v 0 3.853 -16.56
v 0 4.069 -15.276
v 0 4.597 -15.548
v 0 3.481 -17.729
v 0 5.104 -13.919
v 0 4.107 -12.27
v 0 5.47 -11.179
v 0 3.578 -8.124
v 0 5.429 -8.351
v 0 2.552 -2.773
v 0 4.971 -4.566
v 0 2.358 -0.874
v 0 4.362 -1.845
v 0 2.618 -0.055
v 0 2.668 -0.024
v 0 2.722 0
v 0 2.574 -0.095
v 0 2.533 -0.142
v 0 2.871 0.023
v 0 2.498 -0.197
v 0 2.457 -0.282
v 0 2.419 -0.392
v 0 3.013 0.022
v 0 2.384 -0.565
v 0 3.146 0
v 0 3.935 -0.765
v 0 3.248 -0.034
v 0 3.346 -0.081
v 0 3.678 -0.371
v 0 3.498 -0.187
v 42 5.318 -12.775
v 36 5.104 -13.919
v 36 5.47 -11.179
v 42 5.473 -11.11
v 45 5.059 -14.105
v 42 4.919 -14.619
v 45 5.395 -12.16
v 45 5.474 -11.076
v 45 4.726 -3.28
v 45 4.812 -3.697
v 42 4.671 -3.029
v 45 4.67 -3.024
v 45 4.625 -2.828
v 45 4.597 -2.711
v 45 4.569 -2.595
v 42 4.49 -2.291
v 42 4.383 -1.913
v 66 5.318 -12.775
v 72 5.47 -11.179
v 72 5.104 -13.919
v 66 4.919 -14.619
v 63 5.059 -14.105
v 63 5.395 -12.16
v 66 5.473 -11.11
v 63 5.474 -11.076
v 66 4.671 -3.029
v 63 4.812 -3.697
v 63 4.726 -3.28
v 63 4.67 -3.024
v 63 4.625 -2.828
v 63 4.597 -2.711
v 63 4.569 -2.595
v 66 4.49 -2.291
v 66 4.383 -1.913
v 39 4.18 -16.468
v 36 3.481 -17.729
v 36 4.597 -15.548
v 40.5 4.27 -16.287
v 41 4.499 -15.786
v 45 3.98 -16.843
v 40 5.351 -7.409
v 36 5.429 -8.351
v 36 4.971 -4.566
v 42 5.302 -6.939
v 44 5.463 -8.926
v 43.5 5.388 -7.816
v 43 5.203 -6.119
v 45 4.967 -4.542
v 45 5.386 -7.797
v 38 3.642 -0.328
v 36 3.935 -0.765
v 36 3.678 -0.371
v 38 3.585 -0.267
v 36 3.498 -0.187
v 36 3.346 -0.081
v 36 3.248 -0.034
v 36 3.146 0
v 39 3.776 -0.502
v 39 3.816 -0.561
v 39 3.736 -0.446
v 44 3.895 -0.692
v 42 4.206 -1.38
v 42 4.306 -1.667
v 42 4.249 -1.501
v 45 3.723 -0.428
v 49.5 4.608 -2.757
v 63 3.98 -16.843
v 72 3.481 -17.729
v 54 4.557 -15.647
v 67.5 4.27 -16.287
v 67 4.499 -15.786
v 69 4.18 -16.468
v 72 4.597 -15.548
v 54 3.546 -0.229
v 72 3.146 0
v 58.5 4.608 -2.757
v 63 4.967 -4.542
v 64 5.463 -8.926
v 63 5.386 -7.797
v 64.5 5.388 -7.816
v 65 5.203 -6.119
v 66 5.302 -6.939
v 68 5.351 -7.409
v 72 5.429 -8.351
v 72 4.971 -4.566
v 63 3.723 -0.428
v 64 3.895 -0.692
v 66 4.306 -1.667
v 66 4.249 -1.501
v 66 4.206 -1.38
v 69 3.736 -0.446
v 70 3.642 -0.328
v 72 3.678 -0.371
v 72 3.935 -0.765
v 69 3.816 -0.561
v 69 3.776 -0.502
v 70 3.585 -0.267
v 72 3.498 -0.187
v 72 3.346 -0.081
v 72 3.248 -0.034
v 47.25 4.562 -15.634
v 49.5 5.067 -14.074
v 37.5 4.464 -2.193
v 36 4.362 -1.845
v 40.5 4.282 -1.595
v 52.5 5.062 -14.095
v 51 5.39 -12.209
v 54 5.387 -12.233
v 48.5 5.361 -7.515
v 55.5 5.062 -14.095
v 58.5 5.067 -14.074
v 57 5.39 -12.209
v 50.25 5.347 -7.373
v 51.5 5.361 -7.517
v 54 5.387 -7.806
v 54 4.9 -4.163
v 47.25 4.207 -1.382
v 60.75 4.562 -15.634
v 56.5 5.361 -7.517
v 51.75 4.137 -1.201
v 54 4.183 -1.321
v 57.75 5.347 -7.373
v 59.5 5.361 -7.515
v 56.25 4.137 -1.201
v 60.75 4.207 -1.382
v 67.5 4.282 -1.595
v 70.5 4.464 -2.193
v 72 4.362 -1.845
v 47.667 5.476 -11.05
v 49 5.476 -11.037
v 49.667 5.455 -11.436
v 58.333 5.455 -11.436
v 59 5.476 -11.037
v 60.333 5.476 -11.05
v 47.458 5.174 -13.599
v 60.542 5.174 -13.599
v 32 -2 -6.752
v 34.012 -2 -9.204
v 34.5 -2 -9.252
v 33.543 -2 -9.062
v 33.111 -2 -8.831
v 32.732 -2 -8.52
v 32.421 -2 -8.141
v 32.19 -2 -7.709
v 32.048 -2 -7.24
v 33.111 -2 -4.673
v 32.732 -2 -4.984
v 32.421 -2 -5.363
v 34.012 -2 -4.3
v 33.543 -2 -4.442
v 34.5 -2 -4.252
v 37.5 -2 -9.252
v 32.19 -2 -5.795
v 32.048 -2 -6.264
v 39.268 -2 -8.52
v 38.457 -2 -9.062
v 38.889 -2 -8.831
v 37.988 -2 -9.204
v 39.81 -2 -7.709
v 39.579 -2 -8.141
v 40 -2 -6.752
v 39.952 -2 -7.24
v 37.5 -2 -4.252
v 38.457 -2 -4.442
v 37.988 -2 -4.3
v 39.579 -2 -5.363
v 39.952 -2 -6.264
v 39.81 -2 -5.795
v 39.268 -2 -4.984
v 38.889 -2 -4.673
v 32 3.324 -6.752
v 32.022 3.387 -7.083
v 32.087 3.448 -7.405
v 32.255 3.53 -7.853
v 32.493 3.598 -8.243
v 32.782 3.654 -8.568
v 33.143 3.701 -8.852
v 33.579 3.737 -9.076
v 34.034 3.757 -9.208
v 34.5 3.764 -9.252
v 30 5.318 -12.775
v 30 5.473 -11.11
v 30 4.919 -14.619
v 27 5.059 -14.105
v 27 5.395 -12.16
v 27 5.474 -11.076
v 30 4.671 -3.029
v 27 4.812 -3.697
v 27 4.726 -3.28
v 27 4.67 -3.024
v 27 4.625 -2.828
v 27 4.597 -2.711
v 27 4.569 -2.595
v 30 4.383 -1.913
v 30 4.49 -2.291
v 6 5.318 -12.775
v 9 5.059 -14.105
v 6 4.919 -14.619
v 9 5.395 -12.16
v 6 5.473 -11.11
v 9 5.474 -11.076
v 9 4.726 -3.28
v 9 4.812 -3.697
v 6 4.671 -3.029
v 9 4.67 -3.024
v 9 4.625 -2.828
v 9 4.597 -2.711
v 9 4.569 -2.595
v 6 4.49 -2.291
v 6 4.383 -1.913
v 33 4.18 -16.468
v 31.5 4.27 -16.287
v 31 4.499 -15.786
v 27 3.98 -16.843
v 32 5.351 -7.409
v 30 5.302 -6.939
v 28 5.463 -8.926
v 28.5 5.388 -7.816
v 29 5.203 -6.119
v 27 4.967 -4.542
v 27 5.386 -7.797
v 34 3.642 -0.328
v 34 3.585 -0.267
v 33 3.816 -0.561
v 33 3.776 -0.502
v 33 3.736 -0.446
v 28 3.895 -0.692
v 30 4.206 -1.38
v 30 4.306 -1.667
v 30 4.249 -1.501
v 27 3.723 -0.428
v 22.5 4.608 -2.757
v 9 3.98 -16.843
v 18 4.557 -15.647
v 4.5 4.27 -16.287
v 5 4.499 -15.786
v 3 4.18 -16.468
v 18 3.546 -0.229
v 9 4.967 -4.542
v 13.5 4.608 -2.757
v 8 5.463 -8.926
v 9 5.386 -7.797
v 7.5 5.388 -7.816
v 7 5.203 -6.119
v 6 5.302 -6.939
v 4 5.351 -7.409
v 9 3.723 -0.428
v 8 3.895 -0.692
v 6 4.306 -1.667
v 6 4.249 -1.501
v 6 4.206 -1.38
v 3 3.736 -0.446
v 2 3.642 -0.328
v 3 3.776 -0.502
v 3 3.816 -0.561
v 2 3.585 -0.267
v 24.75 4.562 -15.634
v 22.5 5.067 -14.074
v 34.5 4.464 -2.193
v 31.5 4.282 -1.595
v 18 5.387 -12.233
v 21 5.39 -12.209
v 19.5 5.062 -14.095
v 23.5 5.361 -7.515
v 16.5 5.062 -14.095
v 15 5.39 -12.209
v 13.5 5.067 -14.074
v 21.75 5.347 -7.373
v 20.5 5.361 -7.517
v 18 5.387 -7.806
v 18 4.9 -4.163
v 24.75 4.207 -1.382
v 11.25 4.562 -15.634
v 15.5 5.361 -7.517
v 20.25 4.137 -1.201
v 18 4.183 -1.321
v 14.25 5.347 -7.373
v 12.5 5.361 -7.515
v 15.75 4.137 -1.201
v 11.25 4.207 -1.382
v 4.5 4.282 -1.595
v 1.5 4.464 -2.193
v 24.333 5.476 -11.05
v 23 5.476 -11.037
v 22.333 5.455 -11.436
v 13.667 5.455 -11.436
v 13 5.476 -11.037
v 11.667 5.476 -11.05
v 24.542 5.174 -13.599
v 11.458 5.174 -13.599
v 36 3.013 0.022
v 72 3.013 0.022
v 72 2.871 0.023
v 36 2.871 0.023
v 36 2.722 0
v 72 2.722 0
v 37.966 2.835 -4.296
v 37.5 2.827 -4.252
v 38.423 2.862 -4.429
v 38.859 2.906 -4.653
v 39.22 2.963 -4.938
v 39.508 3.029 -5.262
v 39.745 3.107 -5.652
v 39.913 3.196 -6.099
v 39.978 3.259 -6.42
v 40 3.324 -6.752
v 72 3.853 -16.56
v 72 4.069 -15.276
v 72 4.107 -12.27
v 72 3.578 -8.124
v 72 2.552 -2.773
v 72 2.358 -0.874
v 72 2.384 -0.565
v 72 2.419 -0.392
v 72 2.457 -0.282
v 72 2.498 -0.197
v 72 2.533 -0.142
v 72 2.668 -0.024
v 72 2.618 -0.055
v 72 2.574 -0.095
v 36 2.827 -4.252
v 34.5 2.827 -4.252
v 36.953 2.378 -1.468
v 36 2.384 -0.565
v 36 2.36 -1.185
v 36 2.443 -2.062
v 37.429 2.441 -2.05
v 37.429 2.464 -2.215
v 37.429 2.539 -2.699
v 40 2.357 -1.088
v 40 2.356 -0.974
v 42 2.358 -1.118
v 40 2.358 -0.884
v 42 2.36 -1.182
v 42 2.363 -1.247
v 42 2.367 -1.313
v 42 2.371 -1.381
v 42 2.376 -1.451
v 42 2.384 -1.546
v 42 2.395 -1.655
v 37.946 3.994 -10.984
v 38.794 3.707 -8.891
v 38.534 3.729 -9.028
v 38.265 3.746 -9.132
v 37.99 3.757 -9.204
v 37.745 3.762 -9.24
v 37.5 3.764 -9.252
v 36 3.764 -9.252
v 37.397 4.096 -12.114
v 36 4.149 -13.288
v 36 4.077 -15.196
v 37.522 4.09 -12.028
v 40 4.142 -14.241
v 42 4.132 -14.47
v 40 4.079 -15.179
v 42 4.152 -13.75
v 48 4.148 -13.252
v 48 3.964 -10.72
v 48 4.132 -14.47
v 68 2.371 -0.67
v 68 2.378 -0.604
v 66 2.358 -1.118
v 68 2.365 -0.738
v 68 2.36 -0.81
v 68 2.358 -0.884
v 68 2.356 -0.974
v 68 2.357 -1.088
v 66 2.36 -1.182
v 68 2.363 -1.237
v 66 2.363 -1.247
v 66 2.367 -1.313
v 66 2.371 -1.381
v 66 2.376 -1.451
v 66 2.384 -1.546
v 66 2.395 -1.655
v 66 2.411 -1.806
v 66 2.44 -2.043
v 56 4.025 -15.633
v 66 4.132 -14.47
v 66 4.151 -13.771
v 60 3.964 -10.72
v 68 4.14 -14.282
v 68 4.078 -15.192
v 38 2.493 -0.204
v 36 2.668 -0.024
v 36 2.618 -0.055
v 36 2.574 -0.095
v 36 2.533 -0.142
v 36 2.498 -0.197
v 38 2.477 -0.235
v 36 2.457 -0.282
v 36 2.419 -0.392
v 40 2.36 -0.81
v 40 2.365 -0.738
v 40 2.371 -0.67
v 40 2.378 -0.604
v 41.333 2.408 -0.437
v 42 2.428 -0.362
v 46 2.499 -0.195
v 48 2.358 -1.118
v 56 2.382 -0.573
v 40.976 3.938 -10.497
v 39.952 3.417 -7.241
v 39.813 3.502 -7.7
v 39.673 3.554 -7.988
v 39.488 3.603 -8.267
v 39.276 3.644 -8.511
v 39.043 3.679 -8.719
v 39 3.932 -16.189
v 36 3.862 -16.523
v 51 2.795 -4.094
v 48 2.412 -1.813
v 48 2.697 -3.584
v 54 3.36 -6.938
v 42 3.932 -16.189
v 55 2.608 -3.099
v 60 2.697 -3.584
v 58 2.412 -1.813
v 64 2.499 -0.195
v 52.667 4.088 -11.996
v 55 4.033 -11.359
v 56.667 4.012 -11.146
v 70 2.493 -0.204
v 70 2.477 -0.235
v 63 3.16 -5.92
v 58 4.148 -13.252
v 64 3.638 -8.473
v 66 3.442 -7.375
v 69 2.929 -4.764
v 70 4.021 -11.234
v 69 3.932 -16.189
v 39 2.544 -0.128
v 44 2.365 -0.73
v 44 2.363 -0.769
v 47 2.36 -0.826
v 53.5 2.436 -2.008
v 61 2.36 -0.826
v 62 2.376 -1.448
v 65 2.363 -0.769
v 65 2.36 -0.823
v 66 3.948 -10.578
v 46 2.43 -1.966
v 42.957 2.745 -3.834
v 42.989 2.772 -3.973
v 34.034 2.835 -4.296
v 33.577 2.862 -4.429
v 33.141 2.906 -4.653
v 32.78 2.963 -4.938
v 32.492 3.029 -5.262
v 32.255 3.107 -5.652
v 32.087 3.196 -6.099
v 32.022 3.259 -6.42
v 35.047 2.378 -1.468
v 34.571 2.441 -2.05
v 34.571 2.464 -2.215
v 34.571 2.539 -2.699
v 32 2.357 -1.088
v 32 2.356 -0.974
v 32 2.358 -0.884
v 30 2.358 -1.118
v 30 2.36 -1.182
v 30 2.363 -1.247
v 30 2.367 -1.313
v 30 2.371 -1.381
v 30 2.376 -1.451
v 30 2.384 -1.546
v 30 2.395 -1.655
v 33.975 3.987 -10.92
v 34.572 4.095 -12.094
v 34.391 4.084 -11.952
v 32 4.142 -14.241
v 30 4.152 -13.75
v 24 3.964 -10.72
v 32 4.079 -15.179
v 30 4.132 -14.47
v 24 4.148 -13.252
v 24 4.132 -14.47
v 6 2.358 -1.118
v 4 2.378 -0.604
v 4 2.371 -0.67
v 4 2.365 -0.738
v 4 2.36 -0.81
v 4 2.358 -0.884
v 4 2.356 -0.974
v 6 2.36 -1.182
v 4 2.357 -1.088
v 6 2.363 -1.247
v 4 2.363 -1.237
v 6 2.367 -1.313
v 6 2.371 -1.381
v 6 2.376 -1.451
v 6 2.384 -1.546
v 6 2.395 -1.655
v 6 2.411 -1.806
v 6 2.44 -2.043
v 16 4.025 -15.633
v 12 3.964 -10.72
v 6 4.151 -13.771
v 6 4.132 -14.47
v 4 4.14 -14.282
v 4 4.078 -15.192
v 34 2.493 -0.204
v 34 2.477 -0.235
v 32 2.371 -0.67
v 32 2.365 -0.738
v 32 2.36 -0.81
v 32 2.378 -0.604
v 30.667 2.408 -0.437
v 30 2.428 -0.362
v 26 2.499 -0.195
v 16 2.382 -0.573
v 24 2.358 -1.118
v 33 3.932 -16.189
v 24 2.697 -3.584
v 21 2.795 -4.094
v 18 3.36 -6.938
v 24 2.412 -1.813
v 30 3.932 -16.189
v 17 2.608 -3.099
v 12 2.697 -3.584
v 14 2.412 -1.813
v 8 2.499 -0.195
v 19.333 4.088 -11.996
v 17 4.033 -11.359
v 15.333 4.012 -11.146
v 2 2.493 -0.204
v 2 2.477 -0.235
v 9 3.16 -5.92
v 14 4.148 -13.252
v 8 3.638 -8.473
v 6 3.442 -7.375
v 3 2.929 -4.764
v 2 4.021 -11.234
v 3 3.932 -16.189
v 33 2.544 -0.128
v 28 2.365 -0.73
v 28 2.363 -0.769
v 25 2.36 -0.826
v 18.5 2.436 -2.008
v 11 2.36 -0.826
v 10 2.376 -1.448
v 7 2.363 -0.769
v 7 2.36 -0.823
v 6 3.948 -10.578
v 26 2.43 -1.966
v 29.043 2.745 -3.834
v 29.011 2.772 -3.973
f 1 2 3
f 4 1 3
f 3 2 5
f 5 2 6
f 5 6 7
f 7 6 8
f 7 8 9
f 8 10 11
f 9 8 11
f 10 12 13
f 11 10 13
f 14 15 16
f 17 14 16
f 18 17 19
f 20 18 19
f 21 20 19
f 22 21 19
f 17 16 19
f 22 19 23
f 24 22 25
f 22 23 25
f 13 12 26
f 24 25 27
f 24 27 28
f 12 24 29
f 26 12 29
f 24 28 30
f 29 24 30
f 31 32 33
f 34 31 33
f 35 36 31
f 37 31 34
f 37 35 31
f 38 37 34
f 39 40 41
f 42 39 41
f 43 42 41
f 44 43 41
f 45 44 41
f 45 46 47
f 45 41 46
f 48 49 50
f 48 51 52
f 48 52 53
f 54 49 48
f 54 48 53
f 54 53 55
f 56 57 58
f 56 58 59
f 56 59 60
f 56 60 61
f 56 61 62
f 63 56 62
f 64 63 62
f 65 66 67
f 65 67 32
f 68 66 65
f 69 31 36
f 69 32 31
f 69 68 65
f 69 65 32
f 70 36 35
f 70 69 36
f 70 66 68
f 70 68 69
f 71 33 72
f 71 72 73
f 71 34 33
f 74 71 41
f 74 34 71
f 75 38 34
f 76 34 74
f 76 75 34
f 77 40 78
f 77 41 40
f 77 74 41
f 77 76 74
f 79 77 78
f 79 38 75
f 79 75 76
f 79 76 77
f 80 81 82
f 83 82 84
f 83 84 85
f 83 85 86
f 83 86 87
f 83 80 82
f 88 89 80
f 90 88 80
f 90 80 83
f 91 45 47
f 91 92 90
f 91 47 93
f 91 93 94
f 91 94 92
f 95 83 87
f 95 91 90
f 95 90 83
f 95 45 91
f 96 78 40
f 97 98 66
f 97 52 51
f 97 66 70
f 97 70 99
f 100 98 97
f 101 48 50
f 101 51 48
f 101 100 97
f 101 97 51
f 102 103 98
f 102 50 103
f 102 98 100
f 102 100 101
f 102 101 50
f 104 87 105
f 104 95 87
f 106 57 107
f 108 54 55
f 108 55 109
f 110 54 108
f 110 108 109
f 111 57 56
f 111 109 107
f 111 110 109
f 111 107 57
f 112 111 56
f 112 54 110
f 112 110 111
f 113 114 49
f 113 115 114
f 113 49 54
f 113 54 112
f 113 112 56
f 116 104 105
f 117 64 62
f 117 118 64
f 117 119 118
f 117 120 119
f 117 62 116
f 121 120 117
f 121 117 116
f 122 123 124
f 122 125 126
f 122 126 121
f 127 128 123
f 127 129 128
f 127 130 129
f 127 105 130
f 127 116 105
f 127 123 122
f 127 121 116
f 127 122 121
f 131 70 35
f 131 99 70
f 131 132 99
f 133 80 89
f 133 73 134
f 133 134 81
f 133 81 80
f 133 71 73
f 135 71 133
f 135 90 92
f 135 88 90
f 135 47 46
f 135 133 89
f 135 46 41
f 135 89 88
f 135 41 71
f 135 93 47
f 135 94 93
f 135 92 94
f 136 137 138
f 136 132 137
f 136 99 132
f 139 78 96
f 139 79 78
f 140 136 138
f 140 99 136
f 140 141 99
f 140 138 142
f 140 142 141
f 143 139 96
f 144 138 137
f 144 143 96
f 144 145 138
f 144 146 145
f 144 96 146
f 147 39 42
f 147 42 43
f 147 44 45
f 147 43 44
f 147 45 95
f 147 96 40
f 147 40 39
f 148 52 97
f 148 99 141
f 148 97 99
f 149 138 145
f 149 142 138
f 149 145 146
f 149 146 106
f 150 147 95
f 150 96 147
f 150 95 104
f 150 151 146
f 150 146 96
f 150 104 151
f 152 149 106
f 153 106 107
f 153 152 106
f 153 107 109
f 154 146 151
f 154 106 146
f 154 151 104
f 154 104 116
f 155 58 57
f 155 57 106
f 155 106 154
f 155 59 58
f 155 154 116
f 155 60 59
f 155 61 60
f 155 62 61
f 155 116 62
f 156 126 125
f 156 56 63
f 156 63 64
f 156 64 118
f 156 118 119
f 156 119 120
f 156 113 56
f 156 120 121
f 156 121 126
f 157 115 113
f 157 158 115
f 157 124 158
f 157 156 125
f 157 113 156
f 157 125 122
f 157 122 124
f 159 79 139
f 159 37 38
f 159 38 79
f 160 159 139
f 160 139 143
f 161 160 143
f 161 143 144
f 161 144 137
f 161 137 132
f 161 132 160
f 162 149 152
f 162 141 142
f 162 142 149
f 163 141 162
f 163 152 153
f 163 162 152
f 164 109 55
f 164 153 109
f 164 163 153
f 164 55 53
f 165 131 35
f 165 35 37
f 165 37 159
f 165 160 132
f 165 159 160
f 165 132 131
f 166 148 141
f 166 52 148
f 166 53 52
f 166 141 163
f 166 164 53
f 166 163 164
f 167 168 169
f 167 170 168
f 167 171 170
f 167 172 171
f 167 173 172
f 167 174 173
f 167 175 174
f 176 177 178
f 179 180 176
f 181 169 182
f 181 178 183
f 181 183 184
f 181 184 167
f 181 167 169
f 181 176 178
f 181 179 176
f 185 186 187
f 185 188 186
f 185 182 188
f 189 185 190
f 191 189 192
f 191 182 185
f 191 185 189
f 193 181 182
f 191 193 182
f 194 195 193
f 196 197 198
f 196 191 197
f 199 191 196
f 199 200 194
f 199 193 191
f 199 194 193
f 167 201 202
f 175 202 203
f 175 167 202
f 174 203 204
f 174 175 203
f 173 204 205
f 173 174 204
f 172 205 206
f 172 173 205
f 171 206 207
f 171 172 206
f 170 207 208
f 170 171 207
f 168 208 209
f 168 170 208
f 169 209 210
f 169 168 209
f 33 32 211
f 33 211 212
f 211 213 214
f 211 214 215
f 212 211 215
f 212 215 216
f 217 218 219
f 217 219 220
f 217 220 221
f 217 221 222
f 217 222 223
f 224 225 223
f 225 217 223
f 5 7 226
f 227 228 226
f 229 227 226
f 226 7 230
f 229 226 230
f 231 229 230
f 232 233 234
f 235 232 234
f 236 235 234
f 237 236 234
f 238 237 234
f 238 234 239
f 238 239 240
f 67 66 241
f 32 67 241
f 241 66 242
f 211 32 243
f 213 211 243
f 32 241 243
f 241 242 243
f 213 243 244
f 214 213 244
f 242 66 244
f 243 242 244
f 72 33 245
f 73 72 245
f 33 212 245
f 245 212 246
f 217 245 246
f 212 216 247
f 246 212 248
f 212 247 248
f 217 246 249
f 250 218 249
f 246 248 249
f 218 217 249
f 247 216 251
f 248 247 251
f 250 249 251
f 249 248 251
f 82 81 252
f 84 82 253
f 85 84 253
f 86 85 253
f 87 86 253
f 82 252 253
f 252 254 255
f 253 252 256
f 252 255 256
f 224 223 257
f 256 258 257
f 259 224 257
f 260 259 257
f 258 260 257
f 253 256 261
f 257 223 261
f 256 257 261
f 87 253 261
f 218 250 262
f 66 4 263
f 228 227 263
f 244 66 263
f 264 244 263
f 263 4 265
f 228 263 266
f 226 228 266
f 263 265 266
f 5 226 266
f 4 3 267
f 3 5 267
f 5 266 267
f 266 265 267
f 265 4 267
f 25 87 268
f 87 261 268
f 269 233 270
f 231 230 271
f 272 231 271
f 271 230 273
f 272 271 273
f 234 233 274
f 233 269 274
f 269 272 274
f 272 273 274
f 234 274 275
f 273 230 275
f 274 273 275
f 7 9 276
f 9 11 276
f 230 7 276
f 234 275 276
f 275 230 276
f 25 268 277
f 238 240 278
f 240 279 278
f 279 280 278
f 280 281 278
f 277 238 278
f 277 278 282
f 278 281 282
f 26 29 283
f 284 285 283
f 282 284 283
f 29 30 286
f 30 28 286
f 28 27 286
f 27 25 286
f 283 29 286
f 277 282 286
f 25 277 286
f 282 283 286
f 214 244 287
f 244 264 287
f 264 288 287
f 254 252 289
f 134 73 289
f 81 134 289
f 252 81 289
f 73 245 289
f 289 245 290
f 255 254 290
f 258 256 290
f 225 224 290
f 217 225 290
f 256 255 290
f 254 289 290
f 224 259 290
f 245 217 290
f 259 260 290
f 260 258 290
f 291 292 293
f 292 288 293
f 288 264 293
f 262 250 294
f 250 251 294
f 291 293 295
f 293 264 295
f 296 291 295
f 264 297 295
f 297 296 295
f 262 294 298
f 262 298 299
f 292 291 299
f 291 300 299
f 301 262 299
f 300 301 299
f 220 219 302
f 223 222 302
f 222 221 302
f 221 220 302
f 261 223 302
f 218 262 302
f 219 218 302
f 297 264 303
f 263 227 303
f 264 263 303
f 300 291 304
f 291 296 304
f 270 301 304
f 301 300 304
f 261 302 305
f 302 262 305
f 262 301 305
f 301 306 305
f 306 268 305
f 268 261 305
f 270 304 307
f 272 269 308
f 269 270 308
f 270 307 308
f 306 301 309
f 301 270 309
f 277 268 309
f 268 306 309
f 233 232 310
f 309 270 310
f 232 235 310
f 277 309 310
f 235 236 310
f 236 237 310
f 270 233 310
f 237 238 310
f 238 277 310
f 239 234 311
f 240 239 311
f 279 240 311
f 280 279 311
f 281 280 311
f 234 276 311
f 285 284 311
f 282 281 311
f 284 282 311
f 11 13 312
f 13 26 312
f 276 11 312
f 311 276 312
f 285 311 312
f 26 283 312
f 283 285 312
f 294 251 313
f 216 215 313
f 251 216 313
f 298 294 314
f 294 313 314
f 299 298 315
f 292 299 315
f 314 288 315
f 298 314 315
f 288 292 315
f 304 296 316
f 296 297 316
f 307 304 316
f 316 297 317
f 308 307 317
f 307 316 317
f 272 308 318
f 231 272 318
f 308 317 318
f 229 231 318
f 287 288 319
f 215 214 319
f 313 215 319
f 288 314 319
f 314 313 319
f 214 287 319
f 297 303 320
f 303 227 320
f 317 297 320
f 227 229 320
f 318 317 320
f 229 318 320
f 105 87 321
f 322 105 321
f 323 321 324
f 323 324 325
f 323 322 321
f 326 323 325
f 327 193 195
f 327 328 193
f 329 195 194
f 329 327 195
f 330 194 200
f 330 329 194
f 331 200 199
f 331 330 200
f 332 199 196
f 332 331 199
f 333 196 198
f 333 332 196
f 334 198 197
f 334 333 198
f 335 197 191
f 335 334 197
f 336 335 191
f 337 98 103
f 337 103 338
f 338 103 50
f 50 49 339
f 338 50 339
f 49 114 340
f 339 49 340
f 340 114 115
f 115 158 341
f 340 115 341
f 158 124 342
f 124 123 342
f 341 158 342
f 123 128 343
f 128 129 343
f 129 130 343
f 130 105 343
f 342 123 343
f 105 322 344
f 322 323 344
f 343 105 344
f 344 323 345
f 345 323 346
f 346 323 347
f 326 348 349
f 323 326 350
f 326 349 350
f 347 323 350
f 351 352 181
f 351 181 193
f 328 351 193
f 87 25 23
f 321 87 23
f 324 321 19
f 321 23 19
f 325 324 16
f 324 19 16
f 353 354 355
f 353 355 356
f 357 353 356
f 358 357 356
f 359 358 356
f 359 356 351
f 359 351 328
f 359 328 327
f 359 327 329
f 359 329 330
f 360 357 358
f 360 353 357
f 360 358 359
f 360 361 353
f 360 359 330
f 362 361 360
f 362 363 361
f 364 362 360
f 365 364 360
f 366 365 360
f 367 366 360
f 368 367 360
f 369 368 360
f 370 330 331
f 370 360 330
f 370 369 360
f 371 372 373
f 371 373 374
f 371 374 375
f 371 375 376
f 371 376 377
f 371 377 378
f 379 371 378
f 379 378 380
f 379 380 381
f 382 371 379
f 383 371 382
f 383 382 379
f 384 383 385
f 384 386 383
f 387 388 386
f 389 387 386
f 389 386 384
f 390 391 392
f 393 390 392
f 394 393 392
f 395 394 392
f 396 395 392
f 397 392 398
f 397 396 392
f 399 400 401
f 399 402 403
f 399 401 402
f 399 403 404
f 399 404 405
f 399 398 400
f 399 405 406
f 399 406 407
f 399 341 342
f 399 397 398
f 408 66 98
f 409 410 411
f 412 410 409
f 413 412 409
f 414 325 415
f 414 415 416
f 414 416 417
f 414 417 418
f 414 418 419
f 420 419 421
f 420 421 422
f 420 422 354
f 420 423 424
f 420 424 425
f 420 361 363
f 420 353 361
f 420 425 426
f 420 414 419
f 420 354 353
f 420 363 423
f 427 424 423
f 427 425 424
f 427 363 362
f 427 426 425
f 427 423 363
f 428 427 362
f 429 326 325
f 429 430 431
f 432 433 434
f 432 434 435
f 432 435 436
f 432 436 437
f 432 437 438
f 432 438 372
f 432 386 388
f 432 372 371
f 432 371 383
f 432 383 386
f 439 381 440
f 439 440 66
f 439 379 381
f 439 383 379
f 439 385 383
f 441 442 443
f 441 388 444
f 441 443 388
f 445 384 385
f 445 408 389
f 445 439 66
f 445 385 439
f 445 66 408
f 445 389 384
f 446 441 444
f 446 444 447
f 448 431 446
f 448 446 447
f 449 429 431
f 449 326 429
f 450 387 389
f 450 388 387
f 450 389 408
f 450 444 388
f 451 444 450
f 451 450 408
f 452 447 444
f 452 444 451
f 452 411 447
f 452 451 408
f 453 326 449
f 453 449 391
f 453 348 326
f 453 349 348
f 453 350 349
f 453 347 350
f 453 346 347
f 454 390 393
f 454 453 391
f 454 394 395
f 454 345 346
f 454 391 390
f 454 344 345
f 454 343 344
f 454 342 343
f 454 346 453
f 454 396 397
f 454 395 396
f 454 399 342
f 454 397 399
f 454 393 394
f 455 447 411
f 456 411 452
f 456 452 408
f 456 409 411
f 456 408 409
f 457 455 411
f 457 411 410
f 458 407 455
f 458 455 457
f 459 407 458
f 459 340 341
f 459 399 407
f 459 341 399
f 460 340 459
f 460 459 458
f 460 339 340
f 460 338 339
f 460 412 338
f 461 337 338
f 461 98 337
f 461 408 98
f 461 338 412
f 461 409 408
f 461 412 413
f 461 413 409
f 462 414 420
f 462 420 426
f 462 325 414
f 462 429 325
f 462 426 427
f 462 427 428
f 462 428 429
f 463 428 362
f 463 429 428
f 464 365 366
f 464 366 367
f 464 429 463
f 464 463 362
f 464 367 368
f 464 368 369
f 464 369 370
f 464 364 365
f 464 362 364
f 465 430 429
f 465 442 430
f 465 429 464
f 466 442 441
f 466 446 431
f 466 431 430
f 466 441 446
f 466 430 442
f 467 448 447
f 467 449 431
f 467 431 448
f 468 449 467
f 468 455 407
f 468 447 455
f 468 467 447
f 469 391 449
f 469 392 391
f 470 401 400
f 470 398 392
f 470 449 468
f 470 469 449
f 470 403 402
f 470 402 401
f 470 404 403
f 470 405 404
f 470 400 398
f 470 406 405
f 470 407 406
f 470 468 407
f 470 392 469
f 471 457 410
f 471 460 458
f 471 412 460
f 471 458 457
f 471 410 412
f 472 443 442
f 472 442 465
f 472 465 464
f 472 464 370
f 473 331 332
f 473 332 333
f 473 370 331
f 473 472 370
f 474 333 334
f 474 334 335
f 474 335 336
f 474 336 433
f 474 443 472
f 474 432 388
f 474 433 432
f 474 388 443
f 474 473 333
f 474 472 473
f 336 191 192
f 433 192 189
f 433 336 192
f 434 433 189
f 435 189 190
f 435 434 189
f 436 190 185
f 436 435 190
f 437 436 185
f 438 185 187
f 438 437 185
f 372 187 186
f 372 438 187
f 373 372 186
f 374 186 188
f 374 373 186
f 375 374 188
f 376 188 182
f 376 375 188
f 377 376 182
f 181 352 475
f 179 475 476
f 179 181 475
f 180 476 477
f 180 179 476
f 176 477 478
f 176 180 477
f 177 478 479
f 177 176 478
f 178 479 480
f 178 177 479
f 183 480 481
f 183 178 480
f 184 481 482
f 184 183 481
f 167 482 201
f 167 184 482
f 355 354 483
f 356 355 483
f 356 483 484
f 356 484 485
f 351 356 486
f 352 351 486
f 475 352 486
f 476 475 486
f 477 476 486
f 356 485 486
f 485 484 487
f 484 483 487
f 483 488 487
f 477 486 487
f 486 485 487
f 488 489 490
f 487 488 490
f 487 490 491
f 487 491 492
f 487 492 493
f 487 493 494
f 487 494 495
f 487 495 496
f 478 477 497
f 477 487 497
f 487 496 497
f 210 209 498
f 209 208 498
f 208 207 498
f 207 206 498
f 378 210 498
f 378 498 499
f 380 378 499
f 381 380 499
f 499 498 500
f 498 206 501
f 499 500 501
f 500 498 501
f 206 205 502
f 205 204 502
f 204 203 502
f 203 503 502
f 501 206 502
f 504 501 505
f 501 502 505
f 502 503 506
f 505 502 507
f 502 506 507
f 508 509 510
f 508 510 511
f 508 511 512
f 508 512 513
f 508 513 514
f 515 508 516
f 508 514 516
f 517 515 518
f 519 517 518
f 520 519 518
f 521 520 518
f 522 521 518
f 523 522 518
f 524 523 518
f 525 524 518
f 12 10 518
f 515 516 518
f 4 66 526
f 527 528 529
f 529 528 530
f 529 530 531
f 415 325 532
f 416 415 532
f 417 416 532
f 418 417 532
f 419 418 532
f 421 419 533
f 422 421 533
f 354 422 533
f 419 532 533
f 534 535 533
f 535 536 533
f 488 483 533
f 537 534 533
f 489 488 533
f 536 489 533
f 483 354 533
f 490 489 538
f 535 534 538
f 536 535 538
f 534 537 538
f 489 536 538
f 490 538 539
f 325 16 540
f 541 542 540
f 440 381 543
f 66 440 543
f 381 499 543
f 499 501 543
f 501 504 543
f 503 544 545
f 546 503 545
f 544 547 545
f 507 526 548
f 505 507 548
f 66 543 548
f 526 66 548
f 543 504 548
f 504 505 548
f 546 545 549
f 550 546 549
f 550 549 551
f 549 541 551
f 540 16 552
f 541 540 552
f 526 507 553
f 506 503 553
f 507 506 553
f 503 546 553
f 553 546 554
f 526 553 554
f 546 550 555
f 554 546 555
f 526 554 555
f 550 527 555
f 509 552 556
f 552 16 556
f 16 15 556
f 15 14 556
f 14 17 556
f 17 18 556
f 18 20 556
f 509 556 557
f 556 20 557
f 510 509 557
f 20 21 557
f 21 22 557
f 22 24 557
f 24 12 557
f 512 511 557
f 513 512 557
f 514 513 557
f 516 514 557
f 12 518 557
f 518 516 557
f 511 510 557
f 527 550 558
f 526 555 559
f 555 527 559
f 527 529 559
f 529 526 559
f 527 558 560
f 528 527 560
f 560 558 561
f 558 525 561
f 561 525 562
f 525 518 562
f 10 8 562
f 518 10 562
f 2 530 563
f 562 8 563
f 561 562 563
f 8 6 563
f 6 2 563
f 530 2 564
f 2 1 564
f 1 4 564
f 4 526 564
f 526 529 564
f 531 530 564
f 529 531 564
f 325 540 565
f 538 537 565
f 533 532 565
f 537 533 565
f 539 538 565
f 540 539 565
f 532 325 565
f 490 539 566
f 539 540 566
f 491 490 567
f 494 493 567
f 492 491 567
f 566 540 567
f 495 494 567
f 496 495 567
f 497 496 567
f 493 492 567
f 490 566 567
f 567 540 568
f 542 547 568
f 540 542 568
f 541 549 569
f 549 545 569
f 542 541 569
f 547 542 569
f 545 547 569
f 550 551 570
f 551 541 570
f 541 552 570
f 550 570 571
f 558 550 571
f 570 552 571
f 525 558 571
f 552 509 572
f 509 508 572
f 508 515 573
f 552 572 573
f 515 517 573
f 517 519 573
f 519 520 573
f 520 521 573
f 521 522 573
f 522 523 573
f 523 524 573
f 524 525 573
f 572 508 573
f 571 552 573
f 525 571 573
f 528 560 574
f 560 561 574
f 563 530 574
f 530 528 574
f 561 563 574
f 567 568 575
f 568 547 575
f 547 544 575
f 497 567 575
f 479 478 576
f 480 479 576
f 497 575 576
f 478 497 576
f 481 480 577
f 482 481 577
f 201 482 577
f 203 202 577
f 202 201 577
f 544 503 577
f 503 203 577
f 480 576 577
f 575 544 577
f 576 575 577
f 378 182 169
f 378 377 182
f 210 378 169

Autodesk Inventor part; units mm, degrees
ref_plane "YZ Plane" through (0, 0, 0) normal (1, 0, 0) x (0, 1, 0)
ref_plane "XZ Plane" through (0, 0, 0) normal (0, 1, 0) x (-1, 0, 0)
ref_plane "XY Plane" through (0, 0, 0) normal (0, 0, 1) x (1, 0, 0)
sketch "Sketch1" plane through (0, 0, 0) normal (1, 0, 0) x (0, 1, 0)
  line L0 (0, 0) -> (10, 0)
  line L1 (10, 0) -> (10, -18)
  line L2 (10, -18) -> (0, -18)
  line L3 (0, -18) -> (0, 0)
  spline S0 degree 4 poles (3.4811, -17.7286) (4.0754, -16.5984) (6.7935, -13.1301) (4.9927, -3.6489) (3.9933, 0.2842) (2.722, 0) knots 0 0 0 0 0 0.526556 1 1 1 1 1
  spline S1 degree 3 poles (2.722, 0) (1.0371, -0.5817) (5.854, -12.0092) (3.4811, -17.7286) knots 0 0 0 0 1 1 1 1
  point P0 (4.392, -16.0283)
  point P1 (5.4548, -11.4431)
  point P2 (4.8476, -3.8821)
  point P3 (3.6937, -0.39)
  point P4 (2.3577, -0.8758)
  point P5 (3.4812, -7.5865)
  dimension "d0" = 10
  dimension "d1" = 18
extrude "Extrusion1" add sketch "Sketch1" along normal blind 36 contours S0 L0 | L0 S0 S1
sketch "Sketch2" plane through (36, 0, 0) normal (1, 0, 0) x (0, 0, -1)
  line L0 (4.2519, 4) -> (9.2519, 4)
  line L1 (9.2519, 4) -> (9.2519, 0)
  line L2 (9.2519, 0) -> (4.2519, 0)
  line L3 (4.2519, 0) -> (4.2519, 4)
  point P0 (0, 0)
  dimension "d4" = 5
  dimension "d7" = 4
extrude "Extrusion2" add sketch "Sketch2" against normal blind 4
mirror "Mirror1" about plane through (36, 4.1406, -8.6966) normal (1, 0, 0)
sketch "Sketch3" plane through (32, 0, -9.2519) normal (0, -1, 0) x (1, 0, 0)
  line L0 (0, 5) -> (8, 5)
  line L1 (8, 5) -> (8, 0)
  line L2 (8, 0) -> (0, 0)
  line L3 (0, 0) -> (0, 5)
  point P0 (-32, 9.2519)
extrude "Extrusion3" add sketch "Sketch3" along normal blind 2
fillet "Fillet1" radius 2.5 1 edges at (40, 0.4133, -4.2519)
fillet "Fillet2" radius 2.5 1 edges at (32, 0.4133, -4.2519)
fillet "Fillet3" radius 2.5 1 edges at (40, 0.8821, -9.2519)
fillet "Fillet4" radius 2.5 1 edges at (32, 0.8821, -9.2519)
properties part number "2015 Back Spoiler 1"
